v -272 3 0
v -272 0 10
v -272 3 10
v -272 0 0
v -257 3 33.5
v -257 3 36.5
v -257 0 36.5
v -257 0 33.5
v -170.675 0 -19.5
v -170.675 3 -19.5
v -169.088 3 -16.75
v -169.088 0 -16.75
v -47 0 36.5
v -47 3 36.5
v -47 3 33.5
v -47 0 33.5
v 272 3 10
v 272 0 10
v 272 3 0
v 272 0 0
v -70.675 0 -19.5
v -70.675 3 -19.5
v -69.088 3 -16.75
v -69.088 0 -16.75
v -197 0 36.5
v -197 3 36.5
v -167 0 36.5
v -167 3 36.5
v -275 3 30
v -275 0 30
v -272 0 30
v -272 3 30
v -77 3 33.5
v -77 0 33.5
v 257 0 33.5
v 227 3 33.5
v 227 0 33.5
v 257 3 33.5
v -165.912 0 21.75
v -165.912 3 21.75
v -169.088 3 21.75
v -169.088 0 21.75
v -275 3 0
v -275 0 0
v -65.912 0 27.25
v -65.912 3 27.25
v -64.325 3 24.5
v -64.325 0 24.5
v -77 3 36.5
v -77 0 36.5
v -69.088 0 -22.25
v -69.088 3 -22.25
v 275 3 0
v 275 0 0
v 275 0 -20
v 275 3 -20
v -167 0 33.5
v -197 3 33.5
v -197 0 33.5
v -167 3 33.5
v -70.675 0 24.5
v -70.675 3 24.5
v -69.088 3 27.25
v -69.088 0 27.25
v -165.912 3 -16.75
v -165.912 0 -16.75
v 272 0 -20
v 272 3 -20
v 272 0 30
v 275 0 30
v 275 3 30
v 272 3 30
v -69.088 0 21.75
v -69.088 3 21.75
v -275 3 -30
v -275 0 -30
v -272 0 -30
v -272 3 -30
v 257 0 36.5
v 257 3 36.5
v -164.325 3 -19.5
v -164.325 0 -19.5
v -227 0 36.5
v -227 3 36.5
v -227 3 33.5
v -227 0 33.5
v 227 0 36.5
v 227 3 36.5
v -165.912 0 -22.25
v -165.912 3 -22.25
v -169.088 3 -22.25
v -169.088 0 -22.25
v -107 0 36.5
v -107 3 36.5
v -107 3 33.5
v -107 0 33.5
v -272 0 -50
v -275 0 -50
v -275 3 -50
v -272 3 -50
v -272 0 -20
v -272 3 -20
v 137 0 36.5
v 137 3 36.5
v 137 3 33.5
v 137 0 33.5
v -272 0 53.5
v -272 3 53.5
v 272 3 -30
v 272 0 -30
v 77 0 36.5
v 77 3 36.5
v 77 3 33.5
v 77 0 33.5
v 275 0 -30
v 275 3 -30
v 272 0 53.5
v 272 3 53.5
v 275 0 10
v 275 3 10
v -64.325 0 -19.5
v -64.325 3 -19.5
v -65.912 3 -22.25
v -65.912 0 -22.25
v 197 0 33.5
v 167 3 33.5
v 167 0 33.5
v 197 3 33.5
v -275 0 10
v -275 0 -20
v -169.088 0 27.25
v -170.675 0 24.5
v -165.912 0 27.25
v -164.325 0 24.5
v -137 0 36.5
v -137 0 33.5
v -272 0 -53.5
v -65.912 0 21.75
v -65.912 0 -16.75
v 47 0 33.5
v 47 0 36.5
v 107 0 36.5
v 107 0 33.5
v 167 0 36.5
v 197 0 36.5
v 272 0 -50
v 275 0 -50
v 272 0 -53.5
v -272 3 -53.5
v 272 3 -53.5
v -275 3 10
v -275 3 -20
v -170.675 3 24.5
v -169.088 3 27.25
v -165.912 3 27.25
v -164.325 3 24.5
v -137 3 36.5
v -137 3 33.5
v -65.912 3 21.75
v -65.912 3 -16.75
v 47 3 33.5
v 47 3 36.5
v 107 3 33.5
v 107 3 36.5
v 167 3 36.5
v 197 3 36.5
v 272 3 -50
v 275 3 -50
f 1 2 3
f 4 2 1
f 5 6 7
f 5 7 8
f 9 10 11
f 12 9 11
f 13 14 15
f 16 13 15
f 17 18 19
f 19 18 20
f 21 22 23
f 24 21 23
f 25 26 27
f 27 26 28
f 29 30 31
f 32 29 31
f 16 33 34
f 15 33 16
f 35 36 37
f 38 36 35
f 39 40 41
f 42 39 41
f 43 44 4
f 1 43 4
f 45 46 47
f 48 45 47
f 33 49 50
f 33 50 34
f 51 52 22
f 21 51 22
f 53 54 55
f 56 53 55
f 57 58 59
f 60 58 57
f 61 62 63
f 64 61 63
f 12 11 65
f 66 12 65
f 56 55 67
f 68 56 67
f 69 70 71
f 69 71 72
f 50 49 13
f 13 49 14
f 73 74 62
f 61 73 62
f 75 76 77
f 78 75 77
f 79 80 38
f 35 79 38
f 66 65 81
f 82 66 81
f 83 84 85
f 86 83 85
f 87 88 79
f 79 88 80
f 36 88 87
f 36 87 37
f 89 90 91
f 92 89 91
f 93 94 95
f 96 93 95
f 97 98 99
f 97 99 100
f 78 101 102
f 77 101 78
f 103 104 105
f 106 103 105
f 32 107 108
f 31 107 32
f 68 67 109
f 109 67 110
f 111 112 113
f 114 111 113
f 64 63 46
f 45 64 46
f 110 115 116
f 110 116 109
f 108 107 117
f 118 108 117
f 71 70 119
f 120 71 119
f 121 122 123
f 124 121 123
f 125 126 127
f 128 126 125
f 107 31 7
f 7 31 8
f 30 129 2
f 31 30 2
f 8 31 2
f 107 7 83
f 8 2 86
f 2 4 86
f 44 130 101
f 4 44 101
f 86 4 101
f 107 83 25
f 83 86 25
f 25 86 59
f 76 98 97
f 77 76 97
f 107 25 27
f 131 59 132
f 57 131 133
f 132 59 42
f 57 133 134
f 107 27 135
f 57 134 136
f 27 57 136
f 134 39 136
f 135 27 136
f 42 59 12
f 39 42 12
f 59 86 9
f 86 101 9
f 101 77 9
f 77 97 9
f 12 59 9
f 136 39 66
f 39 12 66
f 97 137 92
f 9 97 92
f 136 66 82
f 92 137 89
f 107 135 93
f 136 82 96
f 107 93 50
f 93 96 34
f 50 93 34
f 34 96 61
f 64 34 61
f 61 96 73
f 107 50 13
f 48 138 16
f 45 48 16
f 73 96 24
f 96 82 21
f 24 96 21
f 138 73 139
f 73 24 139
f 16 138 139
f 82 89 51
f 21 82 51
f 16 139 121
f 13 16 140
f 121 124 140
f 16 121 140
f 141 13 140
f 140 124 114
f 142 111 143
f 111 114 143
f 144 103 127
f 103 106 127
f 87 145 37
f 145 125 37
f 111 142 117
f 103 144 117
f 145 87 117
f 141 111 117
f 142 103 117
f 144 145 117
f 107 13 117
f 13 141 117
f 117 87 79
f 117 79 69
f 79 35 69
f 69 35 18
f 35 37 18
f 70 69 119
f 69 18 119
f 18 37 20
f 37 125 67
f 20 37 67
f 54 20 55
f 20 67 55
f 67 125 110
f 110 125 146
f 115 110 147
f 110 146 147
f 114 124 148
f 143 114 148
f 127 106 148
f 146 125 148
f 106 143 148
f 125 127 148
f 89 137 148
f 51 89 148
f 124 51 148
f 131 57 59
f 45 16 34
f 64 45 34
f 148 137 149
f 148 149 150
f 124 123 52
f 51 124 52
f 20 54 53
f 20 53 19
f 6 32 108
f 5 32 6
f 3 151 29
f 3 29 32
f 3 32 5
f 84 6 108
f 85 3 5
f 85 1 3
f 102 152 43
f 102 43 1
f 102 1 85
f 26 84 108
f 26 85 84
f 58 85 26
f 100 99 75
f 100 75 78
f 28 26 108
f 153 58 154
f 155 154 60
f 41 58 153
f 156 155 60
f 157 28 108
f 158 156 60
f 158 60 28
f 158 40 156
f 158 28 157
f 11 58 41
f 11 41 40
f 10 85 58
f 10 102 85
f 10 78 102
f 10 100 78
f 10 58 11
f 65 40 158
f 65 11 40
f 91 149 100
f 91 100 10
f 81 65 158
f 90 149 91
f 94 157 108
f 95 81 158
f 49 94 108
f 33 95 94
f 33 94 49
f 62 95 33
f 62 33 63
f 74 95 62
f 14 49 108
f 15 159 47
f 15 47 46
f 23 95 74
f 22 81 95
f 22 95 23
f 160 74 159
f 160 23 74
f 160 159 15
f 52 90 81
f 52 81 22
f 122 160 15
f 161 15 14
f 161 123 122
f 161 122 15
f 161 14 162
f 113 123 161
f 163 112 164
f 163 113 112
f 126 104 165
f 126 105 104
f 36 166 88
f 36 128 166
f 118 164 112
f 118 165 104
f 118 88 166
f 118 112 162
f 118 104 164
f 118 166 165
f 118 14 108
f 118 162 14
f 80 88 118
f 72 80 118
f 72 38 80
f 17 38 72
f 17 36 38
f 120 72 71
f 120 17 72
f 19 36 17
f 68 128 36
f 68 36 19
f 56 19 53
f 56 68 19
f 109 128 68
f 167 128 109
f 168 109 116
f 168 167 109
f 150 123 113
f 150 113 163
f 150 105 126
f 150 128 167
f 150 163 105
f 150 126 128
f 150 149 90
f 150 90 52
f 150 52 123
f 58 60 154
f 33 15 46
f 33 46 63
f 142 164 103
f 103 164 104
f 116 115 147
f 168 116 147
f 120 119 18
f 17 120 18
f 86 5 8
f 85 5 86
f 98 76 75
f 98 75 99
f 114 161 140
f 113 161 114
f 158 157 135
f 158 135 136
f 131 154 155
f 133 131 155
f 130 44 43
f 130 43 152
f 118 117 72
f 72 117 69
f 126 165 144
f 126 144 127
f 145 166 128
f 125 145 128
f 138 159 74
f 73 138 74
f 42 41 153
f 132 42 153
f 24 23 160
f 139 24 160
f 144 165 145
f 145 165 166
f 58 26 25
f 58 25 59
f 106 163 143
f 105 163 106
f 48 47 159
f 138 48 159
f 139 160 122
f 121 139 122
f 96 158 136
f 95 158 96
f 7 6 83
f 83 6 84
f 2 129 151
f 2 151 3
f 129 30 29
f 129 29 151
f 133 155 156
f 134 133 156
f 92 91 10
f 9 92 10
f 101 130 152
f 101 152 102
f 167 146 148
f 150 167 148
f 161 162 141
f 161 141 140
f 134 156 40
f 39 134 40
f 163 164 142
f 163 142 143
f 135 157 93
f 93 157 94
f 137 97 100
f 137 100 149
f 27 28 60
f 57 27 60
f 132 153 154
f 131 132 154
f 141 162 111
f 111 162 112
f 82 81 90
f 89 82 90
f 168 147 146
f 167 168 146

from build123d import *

# Parameters (mm, degrees)
SKETCH1_W           = 544
SKETCH1_H           = 107
BOSS_EXTRUDE1_DEPTH = 3
SKETCH2_W           = 30
SKETCH2_H           = 3
CUT_EXTRUDE1_DEPTH  = 3
CUT_EXTRUDE2_DEPTH  = 3
SKETCH5_W           = 3
SKETCH5_H           = 20
BOSS_EXTRUDE2_DEPTH = 3


with BuildPart() as part:
    # Sketch1 → Boss-Extrude1 (new body)
    with BuildSketch(Plane(origin=(0, 0, 0), x_dir=(1, 0, 0), z_dir=(0, 1, 0))):
        Rectangle(SKETCH1_W, SKETCH1_H)
    extrude(amount=BOSS_EXTRUDE1_DEPTH)

    # Sketch2 → Cut-Extrude1 (cut)
    with BuildSketch(Plane(origin=(0, 3, 0), x_dir=(1, 0, 0), z_dir=(0, 1, 0))):
        with Locations((62, -35)):
            Rectangle(SKETCH2_W, SKETCH2_H)
        with Locations((122, -35)):
            Rectangle(SKETCH2_W, SKETCH2_H)
        with Locations((182, -35)):
            Rectangle(SKETCH2_W, SKETCH2_H)
        with Locations((242, -35)):
            Rectangle(SKETCH2_W, SKETCH2_H)
        with Locations((-62, -35)):
            Rectangle(SKETCH2_W, SKETCH2_H)
        with Locations((-122, -35)):
            Rectangle(SKETCH2_W, SKETCH2_H)
        with Locations((-182, -35)):
            Rectangle(SKETCH2_W, SKETCH2_H)
        with Locations((-242, -35)):
            Rectangle(SKETCH2_W, SKETCH2_H)
    extrude(amount=-CUT_EXTRUDE1_DEPTH, mode=Mode.SUBTRACT)

    # Sketch4 → Cut-Extrude2 (cut)
    with BuildSketch(Plane(origin=(0, 3, 0), x_dir=(1, 0, 0), z_dir=(0, 1, 0))):
        Polygon((-164.324573519, 19.5), (-165.91228676, 22.25), (-169.08771324, 22.25), (-170.675426481, 19.5), (-169.08771324, 16.75), (-165.91228676, 16.75), align=None)
        Polygon((-164.324573519, -24.5), (-165.91228676, -21.75), (-169.08771324, -21.75), (-170.675426481, -24.5), (-169.08771324, -27.25), (-165.91228676, -27.25), align=None)
        Polygon((-70.675426481, 19.5), (-69.08771324, 16.75), (-65.91228676, 16.75), (-64.324573519, 19.5), (-65.91228676, 22.25), (-69.08771324, 22.25), align=None)
        Polygon((-70.675426481, -24.5), (-69.08771324, -27.25), (-65.91228676, -27.25), (-64.324573519, -24.5), (-65.91228676, -21.75), (-69.08771324, -21.75), align=None)
    extrude(amount=-CUT_EXTRUDE2_DEPTH, mode=Mode.SUBTRACT)

    # Sketch5 → Boss-Extrude2 (add)
    with BuildSketch(Plane(origin=(0, 0, 0), x_dir=(1, 0, 0), z_dir=(0, 1, 0))):
        with Locations((-273.5, 10)):
            Rectangle(SKETCH5_W, SKETCH5_H)
        with Locations((-273.5, -20)):
            Rectangle(SKETCH5_W, SKETCH5_H)
        with Locations((-273.5, 40)):
            Rectangle(SKETCH5_W, SKETCH5_H)
    boss_extrude2 = extrude(amount=BOSS_EXTRUDE2_DEPTH)

    # Mirror1: Boss-Extrude2 across plane
    add(boss_extrude2.mirror(Plane(origin=(0, 0, 0), x_dir=(0, 0, 1), z_dir=(1, 0, 0))))


solid = part.part
